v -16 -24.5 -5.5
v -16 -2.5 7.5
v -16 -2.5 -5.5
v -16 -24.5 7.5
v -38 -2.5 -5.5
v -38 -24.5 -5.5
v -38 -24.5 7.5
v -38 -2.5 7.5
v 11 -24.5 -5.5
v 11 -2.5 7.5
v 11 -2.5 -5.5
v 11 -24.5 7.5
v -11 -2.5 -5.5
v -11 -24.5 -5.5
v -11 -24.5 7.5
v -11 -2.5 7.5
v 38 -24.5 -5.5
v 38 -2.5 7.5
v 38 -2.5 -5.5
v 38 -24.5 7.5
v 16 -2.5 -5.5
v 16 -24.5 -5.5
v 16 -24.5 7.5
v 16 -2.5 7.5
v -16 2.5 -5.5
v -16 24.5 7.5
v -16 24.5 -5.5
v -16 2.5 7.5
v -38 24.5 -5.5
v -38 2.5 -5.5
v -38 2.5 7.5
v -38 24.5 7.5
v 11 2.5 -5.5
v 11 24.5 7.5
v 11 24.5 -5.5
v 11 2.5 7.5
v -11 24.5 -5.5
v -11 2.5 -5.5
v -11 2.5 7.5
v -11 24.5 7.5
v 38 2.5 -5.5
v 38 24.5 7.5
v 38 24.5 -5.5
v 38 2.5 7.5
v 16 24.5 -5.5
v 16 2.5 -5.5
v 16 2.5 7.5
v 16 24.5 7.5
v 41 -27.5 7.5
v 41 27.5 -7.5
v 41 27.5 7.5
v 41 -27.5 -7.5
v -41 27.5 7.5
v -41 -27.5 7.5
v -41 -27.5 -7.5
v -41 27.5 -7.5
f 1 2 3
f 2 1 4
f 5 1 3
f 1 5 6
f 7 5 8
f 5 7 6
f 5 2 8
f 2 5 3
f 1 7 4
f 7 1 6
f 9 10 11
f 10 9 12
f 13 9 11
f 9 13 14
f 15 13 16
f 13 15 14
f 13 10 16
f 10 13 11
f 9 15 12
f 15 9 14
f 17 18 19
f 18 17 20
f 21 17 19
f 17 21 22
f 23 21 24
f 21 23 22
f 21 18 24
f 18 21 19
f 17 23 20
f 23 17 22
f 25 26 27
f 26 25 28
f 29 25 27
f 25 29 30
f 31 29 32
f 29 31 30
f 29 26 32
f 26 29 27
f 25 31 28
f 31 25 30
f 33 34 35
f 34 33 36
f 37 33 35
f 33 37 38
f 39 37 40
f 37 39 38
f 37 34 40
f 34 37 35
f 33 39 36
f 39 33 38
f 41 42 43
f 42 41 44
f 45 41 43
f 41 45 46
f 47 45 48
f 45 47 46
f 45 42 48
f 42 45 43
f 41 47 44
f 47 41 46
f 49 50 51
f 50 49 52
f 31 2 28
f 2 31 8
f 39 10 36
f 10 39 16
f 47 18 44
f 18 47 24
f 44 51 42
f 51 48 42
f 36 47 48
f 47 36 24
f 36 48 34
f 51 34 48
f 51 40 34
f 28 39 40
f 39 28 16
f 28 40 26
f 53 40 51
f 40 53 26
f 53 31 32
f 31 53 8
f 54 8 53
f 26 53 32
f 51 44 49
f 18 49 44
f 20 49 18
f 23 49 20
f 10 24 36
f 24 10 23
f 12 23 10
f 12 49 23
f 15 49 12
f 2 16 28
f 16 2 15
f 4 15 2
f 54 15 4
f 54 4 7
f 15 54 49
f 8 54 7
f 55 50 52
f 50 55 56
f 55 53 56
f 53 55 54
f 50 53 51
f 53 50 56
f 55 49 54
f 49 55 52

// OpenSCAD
$fn = 32;

// ----------------------------------------------------------------------
// Pocket plate 82 x 55 x 15
// 2 x 3 pockets 22 mm square, 13 mm deep
// ----------------------------------------------------------------------

// --- parameters (mm) ---
thickness = 15;  // plate thickness
floor_t = 2;     // material left under each pocket
pocket = 22;     // pocket side length
pitch_x = 27;    // pocket pitch along X
pitch_y = 27;    // pocket pitch along Y
cols = 3;        // pockets per row
rows = 2;        // rows of pockets

// --- derived feature positions (mm) ---
depth = thickness - floor_t;        // = 13   pocket depth, down to the floor
span_x = (cols - 1) * pitch_x;      // = 54   distance between outer pockets
span_y = (rows - 1) * pitch_y;      // = 27   distance between outer pocket rows
origin_x = -span_x / 2;             // = -27   X of the first pocket
origin_y = -span_y / 2;             // = -13.5   Y of the first pocket
plate = [span_x + pocket + 6, span_y + pocket + 6, thickness];  // = [82, 55, 15]   overall size: pockets plus 3 mm of wall on each side
feature_centers = [
  [origin_x + 0 * pitch_x, origin_y + 0 * pitch_y],
  [origin_x + 1 * pitch_x, origin_y + 0 * pitch_y],
  [origin_x + 2 * pitch_x, origin_y + 0 * pitch_y],
  [origin_x + 0 * pitch_x, origin_y + 1 * pitch_y],
  [origin_x + 1 * pitch_x, origin_y + 1 * pitch_y],
  [origin_x + 2 * pitch_x, origin_y + 1 * pitch_y]
];   // pocket centres, used verbatim by the cutter loop

// plate outline, then one pocket per centre in feature_centers
difference() {
  cube(plate, center = true);
  for (centre = feature_centers)
    translate([centre[0] - pocket / 2, centre[1] - pocket / 2, plate[2] / 2 - depth])
      cube([pocket, pocket, depth + 1]);  // centred on the declared pocket centre
}
